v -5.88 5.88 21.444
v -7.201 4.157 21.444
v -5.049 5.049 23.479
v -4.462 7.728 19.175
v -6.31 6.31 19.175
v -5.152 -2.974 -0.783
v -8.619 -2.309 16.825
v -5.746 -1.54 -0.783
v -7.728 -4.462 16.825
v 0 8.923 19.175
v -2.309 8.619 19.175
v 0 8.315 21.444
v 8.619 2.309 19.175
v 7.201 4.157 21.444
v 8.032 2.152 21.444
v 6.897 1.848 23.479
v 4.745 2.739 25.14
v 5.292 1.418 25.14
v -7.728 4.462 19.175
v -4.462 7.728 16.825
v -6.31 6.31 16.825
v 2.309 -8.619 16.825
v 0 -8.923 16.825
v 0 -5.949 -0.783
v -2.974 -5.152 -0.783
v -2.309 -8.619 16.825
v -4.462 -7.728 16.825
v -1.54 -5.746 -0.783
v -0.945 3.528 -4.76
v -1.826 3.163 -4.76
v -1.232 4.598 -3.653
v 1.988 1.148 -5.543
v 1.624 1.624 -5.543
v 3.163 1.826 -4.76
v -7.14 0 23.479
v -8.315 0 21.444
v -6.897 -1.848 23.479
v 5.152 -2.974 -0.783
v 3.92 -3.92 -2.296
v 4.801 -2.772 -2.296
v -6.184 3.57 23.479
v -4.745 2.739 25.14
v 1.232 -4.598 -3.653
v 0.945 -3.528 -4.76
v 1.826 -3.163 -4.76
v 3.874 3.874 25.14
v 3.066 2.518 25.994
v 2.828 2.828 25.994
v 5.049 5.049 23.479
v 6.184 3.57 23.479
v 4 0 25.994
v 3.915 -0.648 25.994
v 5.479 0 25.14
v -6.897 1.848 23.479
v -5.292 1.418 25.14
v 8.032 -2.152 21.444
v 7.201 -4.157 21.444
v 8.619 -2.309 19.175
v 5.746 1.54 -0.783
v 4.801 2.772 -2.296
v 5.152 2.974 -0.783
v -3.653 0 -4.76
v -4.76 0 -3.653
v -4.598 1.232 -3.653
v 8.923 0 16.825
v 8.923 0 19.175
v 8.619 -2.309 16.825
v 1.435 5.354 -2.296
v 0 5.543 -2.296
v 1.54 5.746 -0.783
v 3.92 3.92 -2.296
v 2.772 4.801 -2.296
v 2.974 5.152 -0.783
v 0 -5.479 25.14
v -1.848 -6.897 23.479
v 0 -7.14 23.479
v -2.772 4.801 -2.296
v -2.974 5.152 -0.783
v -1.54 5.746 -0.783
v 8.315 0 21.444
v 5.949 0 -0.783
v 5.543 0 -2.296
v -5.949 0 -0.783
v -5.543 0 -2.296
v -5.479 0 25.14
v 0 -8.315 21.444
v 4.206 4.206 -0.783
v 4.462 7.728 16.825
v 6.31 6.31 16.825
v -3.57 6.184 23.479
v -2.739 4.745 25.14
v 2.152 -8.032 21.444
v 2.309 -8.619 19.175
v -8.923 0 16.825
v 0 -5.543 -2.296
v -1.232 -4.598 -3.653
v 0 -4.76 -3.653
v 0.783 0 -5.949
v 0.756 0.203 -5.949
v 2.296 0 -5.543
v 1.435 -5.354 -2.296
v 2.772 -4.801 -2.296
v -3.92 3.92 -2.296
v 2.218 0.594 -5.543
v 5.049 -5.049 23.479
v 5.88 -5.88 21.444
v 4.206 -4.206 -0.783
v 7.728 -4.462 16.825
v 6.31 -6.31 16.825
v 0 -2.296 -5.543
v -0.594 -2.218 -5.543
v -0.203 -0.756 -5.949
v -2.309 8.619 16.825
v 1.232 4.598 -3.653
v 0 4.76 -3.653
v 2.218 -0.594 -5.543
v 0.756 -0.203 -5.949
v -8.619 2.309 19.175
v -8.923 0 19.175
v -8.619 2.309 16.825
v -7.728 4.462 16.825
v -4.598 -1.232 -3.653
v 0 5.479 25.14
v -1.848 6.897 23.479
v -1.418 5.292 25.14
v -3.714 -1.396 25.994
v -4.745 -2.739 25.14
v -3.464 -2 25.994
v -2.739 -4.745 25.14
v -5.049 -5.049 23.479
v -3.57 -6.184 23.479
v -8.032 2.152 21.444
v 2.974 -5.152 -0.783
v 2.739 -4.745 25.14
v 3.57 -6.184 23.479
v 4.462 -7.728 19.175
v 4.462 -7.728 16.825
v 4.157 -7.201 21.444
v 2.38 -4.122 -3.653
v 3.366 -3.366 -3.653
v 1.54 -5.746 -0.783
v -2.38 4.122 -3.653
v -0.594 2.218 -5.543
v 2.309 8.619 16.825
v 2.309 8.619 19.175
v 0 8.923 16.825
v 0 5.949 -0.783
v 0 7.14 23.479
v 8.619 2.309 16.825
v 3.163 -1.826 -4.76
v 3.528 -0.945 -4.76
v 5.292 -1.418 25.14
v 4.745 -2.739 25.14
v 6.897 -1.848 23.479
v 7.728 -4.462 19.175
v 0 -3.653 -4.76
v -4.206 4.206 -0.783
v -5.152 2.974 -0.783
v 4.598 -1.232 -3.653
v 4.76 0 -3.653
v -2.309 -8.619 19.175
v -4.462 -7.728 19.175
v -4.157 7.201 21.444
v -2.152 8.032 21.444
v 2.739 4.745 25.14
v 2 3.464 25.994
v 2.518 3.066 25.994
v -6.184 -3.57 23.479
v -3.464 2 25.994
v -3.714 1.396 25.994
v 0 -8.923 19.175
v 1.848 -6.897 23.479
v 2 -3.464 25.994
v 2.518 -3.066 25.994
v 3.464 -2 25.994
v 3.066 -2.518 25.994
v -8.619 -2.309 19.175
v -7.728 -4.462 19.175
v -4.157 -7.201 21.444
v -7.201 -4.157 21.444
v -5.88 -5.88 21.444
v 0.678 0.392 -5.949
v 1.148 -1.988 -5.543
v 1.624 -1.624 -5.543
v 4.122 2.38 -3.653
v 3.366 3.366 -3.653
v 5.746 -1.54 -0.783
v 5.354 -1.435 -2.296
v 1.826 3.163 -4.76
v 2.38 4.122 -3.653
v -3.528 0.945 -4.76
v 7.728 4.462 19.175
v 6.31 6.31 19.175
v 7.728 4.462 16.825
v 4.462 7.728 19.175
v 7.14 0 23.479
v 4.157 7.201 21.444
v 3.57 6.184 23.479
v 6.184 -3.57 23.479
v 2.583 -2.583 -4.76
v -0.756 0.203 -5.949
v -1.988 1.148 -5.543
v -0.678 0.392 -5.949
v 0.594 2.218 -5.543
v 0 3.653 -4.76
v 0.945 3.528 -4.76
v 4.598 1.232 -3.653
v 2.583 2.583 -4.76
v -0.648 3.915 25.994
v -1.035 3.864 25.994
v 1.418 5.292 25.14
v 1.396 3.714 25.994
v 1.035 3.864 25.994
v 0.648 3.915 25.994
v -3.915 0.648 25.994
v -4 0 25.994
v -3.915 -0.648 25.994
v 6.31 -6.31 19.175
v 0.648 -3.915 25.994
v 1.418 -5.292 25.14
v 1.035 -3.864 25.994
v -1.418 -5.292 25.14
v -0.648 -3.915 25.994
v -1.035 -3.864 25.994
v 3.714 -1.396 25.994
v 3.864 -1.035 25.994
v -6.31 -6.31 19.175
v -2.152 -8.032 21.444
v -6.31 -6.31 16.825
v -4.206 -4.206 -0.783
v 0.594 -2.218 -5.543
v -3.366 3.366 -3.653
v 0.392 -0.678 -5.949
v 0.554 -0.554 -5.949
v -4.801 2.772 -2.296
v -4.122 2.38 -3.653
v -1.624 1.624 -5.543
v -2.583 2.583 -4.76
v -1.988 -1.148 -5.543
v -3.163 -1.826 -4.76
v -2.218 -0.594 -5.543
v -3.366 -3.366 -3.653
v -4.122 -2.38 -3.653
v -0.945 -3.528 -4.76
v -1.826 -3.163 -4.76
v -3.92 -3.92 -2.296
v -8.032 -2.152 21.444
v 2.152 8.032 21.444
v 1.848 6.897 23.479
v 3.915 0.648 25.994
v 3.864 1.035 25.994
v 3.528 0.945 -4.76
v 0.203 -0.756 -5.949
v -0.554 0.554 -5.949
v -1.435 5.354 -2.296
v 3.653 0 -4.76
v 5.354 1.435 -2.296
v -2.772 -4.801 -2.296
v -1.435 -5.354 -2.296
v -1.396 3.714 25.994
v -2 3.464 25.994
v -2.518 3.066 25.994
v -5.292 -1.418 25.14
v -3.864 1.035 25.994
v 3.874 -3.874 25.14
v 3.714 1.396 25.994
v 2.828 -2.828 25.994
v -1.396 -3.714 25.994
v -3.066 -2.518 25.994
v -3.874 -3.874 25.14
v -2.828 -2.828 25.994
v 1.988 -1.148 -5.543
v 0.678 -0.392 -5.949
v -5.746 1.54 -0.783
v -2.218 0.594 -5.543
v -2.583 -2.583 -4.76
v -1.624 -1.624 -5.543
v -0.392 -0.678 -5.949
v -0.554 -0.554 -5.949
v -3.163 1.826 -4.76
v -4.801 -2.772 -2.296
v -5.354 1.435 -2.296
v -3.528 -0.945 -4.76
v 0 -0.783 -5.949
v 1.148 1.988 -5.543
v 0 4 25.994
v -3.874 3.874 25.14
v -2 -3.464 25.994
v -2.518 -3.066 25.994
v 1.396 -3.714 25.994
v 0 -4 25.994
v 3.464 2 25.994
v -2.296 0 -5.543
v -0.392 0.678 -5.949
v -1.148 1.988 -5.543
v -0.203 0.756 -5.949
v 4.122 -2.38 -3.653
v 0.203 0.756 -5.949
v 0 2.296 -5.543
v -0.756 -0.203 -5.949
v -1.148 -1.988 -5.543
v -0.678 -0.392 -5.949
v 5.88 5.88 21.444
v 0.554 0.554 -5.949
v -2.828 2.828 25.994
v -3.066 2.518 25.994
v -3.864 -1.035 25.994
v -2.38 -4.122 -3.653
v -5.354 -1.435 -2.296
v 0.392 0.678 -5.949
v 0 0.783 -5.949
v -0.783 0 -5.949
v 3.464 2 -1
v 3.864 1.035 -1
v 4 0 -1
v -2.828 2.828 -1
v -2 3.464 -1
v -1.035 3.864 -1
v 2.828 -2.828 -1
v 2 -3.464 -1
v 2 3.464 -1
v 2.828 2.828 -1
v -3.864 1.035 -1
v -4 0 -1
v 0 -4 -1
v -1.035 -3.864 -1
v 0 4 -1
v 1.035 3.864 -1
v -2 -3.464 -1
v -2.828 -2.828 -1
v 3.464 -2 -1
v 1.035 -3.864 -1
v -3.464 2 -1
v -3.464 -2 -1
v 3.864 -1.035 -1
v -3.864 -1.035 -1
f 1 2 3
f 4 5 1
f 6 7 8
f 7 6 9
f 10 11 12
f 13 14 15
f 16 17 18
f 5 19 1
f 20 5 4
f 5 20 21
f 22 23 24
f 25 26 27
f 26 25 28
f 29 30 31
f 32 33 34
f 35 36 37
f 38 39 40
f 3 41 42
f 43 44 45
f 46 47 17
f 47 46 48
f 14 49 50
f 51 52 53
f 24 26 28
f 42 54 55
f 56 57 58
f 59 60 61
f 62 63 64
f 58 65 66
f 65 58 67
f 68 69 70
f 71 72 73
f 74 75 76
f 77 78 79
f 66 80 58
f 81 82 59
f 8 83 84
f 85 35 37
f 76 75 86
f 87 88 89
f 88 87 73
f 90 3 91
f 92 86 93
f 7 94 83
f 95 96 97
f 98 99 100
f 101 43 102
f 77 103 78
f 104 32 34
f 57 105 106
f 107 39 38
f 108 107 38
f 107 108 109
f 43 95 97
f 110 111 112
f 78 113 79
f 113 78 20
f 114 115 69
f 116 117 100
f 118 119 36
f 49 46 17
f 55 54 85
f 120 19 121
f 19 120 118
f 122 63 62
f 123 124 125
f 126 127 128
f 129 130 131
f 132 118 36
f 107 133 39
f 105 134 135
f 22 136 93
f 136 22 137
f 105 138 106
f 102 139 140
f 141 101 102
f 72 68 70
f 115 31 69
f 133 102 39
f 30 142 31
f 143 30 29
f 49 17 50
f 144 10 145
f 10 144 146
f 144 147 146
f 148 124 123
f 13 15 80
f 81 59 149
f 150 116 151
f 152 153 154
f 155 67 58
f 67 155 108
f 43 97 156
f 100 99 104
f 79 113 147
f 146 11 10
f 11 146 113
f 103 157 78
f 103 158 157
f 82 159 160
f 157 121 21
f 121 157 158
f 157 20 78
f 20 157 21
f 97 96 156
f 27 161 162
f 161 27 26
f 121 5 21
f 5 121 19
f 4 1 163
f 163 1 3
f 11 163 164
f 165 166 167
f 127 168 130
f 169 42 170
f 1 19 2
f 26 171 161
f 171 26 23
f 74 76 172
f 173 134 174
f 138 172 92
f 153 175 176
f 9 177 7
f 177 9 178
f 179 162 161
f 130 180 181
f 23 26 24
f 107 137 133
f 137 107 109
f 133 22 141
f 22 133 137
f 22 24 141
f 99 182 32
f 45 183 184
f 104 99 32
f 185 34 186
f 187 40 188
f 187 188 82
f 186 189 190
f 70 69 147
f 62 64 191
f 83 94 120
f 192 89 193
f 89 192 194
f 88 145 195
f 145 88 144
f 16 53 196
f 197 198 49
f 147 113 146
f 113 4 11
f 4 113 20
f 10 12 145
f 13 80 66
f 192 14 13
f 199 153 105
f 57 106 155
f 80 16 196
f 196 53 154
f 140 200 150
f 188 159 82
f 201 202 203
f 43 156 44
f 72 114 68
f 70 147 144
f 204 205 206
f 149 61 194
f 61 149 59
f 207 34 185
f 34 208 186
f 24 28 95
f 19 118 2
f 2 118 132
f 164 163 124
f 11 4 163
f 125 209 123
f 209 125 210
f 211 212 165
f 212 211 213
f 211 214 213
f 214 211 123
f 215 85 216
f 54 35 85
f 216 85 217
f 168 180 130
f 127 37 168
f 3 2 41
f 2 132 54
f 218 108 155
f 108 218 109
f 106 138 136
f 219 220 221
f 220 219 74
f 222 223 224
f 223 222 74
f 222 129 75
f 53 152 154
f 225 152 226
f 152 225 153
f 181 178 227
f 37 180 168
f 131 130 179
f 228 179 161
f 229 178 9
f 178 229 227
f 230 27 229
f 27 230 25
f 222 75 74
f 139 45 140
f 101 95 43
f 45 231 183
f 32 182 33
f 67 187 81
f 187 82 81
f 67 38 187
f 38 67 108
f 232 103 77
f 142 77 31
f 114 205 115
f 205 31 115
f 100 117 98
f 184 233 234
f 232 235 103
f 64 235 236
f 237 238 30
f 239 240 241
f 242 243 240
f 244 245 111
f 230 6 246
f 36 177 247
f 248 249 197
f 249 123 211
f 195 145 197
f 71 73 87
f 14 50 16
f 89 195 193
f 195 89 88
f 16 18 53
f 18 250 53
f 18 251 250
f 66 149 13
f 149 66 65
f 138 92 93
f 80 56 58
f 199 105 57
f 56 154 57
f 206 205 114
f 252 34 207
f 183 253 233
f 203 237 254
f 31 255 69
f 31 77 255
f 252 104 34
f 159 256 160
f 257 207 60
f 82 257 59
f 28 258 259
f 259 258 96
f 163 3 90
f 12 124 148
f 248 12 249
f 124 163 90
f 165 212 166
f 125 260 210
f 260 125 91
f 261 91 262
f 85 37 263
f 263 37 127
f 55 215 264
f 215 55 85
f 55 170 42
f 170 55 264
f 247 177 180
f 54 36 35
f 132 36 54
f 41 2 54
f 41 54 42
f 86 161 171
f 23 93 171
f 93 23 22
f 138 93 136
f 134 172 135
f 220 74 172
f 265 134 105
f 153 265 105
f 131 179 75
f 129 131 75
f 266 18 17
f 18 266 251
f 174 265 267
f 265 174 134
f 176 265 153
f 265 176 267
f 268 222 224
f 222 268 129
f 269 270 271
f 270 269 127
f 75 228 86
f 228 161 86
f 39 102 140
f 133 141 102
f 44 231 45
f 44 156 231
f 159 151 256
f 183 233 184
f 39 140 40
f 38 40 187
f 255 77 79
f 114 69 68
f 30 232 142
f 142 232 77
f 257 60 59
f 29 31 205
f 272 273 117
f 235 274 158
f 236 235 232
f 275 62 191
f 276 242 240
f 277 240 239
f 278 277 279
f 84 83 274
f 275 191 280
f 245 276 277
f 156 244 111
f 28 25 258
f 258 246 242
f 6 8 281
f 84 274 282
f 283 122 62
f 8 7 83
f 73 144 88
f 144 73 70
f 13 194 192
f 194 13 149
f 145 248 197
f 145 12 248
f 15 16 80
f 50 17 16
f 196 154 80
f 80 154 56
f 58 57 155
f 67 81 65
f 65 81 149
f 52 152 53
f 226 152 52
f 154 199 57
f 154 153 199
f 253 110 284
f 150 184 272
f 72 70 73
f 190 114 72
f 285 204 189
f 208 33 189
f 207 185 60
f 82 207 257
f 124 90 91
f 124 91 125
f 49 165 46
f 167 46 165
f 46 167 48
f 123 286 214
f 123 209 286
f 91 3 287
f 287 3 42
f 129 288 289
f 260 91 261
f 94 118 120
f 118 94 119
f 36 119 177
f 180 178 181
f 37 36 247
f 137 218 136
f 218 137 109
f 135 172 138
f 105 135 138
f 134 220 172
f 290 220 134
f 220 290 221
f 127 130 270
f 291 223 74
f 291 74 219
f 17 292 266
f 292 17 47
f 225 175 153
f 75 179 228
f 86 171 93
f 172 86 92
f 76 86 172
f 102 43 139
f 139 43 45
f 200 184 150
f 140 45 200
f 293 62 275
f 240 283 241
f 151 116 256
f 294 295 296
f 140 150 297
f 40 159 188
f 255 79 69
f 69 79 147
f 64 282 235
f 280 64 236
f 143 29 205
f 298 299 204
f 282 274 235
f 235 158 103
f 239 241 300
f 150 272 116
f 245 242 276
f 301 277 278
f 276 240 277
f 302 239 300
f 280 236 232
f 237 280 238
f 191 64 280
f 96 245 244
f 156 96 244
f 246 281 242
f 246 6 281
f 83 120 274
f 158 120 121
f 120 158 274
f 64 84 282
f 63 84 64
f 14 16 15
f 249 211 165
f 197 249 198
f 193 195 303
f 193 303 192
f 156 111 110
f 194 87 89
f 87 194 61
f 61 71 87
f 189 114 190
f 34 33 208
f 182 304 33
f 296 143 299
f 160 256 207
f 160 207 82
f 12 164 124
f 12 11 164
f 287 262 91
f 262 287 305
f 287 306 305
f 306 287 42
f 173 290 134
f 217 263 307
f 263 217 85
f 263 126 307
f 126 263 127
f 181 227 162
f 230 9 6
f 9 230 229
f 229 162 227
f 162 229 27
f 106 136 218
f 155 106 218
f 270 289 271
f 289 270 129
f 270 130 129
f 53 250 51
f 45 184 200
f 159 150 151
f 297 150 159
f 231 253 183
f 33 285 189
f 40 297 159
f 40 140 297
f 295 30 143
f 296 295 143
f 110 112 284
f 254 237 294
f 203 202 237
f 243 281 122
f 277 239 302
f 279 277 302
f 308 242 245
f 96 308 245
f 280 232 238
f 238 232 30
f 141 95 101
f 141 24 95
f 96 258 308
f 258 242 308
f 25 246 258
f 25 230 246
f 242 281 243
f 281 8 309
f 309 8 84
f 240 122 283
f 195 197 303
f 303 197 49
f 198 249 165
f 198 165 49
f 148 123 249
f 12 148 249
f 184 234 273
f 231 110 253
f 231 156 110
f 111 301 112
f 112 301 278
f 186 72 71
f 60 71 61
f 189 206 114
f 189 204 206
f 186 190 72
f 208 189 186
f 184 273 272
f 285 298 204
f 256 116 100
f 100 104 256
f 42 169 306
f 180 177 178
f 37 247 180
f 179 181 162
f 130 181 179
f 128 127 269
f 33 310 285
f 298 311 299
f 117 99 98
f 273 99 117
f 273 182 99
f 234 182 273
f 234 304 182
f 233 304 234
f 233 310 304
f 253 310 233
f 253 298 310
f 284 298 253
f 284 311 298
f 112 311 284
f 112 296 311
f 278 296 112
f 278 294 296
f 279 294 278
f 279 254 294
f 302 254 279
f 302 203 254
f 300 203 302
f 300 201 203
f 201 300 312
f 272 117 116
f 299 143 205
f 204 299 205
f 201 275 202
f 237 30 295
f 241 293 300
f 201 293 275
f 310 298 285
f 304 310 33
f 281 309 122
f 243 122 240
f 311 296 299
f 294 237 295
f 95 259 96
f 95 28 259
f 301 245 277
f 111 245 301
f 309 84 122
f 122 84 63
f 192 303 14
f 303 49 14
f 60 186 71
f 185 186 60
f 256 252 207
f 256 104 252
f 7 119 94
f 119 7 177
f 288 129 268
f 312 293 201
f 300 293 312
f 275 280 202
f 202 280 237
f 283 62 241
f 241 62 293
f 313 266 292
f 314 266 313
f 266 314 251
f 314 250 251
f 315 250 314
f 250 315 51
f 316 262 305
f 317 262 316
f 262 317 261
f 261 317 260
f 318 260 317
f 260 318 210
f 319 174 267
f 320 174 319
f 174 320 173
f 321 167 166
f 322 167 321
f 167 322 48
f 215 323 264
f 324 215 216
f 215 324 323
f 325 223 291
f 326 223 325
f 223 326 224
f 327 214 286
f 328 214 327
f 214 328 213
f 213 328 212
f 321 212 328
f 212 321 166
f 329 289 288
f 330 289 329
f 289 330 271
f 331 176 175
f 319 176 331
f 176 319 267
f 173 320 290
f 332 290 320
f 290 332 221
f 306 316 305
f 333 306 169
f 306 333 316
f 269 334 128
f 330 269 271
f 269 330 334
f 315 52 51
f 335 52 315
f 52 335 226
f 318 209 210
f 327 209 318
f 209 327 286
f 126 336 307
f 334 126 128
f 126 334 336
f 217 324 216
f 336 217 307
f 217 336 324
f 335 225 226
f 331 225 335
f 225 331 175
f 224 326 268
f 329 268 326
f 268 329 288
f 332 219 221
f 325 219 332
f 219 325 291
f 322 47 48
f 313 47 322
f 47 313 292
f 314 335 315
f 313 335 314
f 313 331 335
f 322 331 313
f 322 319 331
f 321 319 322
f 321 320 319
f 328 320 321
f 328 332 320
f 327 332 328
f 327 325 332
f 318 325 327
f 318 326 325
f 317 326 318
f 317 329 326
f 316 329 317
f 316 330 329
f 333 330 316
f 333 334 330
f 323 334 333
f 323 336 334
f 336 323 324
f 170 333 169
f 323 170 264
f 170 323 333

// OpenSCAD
// D4 — a convex hull, then bored. A hull carries no authored surface, so before
// its faces were keyed by the operands their corners came from, the bore mouth
// and the nose rim both broke into disconnected arcs.
difference() {
  hull() {
    sphere(r = 6, $fn = 24);
    translate([0, 0, 18]) sphere(r = 9, $fn = 24);
  }
  translate([0, 0, -1]) cylinder(h = 30, r = 4, $fn = 24);
}
